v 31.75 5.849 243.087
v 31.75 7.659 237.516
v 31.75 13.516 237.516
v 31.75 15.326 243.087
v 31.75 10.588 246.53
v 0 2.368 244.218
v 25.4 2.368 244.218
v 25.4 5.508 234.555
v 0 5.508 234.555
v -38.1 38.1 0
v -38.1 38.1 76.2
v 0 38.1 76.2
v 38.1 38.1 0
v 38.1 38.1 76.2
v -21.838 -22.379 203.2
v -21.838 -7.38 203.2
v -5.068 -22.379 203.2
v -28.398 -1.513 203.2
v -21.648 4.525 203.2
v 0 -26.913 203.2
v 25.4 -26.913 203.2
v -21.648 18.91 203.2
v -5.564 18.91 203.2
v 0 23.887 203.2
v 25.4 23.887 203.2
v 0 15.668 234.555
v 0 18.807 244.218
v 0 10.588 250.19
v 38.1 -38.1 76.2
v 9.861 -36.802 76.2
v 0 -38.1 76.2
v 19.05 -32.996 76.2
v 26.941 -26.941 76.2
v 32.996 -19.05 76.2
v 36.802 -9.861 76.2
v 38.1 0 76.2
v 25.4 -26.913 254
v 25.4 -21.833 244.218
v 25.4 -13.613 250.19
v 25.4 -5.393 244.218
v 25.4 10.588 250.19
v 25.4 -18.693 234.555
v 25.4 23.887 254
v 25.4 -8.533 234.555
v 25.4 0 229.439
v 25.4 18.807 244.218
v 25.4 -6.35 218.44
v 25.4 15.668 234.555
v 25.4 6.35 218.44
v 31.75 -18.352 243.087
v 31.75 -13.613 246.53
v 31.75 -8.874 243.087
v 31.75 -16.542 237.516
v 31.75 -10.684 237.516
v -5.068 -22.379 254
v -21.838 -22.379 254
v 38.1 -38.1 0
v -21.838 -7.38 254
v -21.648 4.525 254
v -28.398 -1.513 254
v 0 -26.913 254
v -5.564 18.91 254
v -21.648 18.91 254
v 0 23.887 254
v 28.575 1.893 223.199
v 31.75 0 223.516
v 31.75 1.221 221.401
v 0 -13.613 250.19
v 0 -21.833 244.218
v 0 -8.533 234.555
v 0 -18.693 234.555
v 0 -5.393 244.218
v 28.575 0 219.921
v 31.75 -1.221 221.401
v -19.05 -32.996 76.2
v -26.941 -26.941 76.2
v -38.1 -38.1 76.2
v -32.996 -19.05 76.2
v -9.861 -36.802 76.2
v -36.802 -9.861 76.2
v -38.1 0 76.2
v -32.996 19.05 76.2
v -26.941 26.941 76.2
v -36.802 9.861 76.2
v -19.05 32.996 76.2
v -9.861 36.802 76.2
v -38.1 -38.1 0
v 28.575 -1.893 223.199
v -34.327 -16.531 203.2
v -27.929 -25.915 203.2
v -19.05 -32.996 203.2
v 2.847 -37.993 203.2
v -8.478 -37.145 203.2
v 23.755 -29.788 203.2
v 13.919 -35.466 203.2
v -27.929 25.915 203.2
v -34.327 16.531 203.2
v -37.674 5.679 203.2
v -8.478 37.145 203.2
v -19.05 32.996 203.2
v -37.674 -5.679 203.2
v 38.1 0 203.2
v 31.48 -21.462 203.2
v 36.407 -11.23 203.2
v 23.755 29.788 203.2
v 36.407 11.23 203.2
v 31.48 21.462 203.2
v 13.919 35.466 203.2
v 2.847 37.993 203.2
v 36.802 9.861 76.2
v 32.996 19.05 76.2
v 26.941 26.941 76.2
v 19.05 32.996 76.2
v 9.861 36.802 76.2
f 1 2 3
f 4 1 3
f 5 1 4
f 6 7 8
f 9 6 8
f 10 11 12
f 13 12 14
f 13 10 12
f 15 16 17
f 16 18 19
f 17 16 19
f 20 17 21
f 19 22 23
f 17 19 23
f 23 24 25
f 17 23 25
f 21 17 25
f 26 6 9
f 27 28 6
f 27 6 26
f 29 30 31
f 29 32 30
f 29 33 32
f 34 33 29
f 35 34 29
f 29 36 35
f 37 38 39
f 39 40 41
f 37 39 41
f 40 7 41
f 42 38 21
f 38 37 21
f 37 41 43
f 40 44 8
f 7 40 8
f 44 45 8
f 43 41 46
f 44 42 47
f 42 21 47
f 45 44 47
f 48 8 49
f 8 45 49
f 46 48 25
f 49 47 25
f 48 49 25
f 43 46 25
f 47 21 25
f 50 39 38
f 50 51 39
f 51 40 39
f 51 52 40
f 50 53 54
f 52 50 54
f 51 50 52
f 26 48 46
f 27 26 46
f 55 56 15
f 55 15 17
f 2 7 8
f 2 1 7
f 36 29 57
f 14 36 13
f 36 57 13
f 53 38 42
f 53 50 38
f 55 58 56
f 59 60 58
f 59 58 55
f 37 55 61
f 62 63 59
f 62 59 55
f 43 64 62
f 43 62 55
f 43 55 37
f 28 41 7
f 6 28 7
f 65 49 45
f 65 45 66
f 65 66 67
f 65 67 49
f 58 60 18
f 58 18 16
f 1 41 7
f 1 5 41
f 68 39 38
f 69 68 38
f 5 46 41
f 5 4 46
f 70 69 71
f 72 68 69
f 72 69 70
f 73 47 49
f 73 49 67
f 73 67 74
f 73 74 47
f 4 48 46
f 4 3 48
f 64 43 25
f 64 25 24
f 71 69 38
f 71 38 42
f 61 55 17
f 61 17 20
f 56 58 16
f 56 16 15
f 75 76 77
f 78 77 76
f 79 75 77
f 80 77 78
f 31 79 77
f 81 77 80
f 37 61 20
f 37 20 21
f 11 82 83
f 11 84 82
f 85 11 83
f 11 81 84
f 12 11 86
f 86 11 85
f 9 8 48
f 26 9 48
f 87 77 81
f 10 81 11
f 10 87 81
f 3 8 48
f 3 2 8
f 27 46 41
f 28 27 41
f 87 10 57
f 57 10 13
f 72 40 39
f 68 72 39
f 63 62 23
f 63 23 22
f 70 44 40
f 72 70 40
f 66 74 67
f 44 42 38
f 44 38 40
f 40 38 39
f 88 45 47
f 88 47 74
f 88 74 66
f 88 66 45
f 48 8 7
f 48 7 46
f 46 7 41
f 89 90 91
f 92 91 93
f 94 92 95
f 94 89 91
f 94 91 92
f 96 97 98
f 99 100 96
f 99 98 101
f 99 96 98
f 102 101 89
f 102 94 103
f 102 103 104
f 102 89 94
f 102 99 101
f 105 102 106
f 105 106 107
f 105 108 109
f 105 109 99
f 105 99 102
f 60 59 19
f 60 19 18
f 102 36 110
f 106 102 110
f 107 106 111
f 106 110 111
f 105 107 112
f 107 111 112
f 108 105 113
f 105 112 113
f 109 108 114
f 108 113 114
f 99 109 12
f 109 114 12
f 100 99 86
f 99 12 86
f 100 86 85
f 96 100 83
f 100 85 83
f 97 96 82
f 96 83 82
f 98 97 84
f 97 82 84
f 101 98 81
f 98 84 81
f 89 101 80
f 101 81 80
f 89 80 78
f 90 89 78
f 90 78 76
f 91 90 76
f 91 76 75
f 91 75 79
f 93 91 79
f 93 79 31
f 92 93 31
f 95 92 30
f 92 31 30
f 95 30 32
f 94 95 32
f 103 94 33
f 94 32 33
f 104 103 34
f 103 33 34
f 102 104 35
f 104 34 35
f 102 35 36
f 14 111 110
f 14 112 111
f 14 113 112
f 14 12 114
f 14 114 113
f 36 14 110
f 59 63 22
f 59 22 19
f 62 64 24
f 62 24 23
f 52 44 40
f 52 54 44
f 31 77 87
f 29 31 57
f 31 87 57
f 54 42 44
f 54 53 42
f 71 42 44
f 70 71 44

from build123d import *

# Parameters (mm, degrees)
F0_W     = 76.2
F0_H     = 76.2
F1_DEPTH = 76.2
F2_R     = 38.1
F3_DEPTH = 127
F5_DEPTH = 50.8
F7_DEPTH = 25.4
F8_DEPTH = 6.35
F8_TAPER = 25


with BuildPart() as f1:
    # F0 (on Top) → F1 (new body)
    with BuildSketch(Plane.XY):
        Rectangle(F0_W, F0_H)
    extrude(amount=F1_DEPTH)

    # F2 (on face) → F3 (join)
    with BuildSketch(Plane.XY.offset(76.2)):
        Circle(F2_R)
    extrude(amount=F3_DEPTH)


with BuildPart() as f5:
    # F4 (on face) → F5 (new body)
    with BuildSketch(Plane.XY.offset(203.2)):
        Polygon((25.4, 23.8873343915), (0, 23.8873343915), (-5.5644540802, 18.9103353591), (-21.6480437666, 4.5247354147), (-28.3980633142, -1.5126656085), (-21.8382618305, -7.3799304232), (-5.0683489621, -22.3793964833), (0, -26.9126656085), (25.4, -26.9126656085), align=None)
        Polygon((-21.6480437666, 4.5247354147), (-5.5644540802, 18.9103353591), (-21.6480437666, 18.9103353591), align=None)
        Polygon((-21.8382618305, -22.3793964833), (-5.0683489621, -22.3793964833), (-21.8382618305, -7.3799304232), align=None)
    extrude(amount=F5_DEPTH)

    # F6 (on face) → F7 (cut)
    with BuildSketch(Plane.YZ.offset(25.4)):
        Polygon((-18.6930529457, 234.5553676311), (-8.5330529457, 234.5553676311), (-5.3934402828, 244.2181018367), (-13.6130529457, 250.19), (-21.8326656085, 244.2181018367), align=None)
        Polygon((5.5077217286, 234.5553676311), (15.6677217286, 234.5553676311), (18.8073343915, 244.2181018367), (10.5877217286, 250.19), (2.3681090658, 244.2181018367), align=None)
    extrude(amount=-F7_DEPTH, mode=Mode.SUBTRACT)

    # F6 (on face) → F8 (join)
    with BuildSketch(Plane.YZ.offset(25.4)):
        Polygon((-18.6930529457, 234.5553676311), (-8.5330529457, 234.5553676311), (-5.3934402828, 244.2181018367), (-13.6130529457, 250.19), (-21.8326656085, 244.2181018367), align=None)
        Polygon((5.5077217286, 234.5553676311), (15.6677217286, 234.5553676311), (18.8073343915, 244.2181018367), (10.5877217286, 250.19), (2.3681090658, 244.2181018367), align=None)
        Polygon((-6.35, 218.44), (6.35, 218.44), (0, 229.4385226281), align=None)
    extrude(amount=F8_DEPTH, taper=F8_TAPER)


solid = Compound([f1.part, f5.part])
